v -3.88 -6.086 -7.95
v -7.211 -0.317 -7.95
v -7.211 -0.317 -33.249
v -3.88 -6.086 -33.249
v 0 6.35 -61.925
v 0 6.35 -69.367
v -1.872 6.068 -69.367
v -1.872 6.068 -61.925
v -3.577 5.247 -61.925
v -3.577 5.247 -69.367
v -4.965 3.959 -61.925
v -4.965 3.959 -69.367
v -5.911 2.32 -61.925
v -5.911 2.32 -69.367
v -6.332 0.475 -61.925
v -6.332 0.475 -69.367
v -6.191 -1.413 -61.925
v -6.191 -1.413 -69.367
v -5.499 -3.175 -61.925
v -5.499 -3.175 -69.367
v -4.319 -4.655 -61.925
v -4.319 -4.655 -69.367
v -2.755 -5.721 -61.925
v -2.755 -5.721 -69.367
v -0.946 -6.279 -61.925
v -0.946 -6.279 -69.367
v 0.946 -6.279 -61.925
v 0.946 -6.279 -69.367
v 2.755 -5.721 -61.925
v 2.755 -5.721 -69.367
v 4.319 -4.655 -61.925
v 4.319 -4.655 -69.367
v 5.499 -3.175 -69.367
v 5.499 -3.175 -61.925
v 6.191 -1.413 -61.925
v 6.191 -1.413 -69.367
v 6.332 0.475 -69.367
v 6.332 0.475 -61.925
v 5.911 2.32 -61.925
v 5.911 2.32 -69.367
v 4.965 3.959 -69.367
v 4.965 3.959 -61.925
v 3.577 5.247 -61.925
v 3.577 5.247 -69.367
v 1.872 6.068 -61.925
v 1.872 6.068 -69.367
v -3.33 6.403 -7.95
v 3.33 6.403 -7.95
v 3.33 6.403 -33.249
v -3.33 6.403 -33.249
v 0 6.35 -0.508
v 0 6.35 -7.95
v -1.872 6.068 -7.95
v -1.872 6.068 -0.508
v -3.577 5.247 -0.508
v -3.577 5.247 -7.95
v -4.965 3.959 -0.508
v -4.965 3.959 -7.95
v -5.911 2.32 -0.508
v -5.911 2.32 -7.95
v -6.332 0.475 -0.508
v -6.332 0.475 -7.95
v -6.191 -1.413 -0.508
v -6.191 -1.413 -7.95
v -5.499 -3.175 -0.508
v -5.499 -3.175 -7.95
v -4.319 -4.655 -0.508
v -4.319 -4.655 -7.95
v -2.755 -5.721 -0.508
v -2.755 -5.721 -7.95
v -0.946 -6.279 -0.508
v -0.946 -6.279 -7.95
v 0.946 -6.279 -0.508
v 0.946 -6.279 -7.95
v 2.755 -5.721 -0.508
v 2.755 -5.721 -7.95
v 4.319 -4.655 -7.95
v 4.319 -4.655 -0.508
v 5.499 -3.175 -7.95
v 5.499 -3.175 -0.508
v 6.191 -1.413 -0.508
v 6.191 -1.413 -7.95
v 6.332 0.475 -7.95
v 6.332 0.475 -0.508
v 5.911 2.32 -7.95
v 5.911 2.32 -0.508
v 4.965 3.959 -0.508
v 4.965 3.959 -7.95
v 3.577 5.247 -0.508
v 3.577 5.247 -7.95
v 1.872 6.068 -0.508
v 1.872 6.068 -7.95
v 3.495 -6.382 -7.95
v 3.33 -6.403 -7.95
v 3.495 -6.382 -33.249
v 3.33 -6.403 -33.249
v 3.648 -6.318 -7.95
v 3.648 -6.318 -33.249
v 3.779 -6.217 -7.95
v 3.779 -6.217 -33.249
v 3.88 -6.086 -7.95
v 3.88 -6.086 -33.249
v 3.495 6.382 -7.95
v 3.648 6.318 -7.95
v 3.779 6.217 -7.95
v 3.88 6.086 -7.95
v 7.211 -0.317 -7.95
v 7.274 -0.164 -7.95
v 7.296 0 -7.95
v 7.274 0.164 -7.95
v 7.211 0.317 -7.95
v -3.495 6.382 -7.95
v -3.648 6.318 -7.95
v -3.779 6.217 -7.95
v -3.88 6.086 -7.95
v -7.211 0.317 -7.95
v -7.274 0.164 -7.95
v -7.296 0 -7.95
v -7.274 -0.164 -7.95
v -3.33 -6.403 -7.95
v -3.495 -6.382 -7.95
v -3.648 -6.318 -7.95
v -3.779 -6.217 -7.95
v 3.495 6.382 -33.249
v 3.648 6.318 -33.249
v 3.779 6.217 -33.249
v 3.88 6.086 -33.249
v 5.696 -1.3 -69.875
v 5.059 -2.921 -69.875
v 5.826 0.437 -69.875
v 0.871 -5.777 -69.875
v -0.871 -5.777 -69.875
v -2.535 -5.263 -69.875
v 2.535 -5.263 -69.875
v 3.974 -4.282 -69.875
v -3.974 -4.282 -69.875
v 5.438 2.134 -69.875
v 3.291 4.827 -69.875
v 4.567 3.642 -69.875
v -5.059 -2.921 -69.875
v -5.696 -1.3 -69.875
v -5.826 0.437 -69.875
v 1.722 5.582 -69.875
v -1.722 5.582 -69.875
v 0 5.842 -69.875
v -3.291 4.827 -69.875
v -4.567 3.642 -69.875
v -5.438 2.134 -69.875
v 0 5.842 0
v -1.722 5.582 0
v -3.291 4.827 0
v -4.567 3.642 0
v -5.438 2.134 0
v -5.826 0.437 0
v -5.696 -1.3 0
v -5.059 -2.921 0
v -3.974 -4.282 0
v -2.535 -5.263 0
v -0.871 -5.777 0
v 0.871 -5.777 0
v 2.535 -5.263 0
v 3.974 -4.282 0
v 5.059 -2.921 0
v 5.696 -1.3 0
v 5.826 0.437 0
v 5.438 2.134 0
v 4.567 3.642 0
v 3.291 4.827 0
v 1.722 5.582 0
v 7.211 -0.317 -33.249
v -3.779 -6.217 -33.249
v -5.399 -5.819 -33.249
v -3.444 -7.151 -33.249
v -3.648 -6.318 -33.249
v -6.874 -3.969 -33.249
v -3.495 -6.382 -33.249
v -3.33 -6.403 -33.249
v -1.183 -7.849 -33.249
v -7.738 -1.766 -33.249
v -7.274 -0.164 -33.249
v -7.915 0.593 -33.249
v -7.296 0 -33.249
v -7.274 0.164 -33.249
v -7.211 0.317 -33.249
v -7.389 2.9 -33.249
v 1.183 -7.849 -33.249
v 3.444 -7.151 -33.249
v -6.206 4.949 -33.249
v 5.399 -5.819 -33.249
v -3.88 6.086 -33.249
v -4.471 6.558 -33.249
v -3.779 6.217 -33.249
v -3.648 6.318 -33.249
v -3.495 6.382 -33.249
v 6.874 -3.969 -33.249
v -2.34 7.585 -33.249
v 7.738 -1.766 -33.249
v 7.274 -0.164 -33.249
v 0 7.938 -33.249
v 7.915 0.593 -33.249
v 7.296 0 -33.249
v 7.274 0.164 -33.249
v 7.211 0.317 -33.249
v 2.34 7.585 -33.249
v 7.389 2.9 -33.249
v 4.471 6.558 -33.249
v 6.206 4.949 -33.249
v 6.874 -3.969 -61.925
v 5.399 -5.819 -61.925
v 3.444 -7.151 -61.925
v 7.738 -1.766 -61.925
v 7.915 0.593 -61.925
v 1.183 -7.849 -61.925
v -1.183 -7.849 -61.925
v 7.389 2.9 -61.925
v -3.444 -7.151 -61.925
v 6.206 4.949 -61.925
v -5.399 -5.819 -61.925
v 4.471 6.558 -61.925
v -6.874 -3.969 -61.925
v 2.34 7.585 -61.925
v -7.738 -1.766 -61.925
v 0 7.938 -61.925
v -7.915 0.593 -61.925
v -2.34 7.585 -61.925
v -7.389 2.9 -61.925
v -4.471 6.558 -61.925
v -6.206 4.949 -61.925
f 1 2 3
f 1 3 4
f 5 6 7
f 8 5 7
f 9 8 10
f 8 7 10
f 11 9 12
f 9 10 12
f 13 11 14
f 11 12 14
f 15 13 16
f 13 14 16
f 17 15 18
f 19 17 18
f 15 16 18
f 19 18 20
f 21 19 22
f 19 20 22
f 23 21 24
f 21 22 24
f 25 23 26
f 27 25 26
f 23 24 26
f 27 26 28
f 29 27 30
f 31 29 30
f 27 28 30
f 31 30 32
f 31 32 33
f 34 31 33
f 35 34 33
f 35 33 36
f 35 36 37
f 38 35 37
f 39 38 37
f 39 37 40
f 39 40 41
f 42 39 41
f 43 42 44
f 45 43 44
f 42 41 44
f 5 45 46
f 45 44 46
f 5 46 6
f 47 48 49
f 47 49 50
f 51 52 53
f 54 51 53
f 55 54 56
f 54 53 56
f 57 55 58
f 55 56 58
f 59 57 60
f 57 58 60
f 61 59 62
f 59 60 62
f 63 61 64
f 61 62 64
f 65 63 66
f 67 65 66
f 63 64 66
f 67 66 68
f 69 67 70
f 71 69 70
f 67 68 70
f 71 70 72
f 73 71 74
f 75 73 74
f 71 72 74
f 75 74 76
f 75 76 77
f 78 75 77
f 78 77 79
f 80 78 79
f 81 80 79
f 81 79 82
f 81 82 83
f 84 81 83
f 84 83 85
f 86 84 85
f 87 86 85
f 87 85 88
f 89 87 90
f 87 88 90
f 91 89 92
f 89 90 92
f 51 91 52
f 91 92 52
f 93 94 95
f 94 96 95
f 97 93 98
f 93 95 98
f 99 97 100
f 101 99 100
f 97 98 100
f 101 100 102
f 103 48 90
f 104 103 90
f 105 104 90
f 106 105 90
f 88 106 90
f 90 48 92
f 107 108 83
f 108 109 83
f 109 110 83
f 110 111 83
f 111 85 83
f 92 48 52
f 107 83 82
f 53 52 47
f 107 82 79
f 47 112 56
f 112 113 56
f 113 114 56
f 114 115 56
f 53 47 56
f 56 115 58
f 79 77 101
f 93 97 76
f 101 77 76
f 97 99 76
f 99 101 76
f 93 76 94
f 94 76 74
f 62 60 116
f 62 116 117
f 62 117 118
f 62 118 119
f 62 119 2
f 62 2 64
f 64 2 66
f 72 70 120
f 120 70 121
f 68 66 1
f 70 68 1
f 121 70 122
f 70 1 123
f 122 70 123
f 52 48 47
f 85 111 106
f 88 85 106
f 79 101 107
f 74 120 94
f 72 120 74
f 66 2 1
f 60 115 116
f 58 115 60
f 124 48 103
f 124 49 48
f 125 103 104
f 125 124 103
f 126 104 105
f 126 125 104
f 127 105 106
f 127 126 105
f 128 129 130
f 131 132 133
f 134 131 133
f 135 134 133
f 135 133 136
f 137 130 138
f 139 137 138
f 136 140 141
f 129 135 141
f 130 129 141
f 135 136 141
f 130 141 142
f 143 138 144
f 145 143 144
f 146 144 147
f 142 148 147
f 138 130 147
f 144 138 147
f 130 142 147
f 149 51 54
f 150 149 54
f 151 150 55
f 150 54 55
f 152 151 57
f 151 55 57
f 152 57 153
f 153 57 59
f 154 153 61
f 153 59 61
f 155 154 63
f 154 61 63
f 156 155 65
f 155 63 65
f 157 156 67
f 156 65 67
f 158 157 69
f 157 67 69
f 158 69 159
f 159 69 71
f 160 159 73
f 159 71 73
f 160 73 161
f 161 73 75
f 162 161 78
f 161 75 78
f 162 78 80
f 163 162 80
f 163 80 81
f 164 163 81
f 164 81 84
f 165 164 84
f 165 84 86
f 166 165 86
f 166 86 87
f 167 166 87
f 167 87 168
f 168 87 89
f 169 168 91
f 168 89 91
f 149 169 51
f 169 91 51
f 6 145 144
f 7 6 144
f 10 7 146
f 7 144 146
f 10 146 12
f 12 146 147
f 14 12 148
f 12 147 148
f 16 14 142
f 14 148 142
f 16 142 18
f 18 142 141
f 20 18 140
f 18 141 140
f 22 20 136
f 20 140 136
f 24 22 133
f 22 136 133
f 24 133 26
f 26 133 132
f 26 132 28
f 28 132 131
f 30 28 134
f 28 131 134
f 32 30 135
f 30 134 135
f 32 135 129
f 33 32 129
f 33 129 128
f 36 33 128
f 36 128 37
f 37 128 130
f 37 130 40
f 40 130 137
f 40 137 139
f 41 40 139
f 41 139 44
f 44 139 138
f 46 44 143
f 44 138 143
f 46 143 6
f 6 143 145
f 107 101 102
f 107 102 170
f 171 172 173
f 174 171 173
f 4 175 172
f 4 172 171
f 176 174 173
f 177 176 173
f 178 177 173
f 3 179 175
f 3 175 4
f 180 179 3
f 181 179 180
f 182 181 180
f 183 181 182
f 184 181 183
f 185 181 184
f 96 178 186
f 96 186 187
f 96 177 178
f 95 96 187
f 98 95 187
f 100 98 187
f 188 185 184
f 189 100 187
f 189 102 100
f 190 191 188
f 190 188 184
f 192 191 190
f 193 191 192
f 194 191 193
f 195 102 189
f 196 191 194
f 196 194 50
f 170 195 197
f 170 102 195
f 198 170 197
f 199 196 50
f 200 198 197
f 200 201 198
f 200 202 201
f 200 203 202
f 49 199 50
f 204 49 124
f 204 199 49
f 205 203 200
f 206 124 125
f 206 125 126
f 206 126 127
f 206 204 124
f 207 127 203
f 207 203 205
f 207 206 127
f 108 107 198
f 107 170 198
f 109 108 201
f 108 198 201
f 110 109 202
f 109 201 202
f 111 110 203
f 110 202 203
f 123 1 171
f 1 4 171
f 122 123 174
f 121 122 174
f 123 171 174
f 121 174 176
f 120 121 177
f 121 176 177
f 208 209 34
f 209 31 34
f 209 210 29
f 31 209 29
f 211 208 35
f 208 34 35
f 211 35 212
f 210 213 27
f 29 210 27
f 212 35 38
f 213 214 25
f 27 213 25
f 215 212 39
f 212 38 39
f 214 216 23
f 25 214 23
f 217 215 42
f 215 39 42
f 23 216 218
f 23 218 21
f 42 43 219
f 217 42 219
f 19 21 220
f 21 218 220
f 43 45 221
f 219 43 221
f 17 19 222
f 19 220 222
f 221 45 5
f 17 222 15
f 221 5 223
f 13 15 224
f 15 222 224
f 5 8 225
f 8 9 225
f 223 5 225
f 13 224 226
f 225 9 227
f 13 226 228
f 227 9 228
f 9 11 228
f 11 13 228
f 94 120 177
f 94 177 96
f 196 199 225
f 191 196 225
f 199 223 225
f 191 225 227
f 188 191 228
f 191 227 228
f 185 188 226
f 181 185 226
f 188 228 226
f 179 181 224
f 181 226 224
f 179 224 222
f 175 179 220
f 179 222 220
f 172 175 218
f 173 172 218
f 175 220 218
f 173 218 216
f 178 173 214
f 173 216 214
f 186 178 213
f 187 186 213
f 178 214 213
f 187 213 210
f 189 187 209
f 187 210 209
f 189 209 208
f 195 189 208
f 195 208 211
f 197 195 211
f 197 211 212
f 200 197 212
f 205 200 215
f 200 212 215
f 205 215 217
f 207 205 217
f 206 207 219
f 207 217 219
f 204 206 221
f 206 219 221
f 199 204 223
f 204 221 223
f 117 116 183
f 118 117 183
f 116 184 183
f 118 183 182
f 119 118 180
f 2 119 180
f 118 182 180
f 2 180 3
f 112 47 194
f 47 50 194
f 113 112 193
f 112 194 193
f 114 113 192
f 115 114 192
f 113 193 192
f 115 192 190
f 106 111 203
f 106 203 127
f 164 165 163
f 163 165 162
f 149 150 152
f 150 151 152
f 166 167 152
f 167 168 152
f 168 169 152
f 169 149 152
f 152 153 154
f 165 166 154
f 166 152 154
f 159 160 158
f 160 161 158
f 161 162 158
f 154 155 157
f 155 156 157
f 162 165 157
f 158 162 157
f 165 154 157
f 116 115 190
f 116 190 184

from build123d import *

# Parameters (mm, degrees)
SKETCH2_OUTSIDE_W  = 32.552
SKETCH2_OUTSIDE_H  = 32.553
CUT_EXTRUDE1_DEPTH = 25.2984
CHAMFER1_SIZE      = 0.508
FILLET1_R          = 0.635


with BuildPart() as part:
    # Sketch1 → Revolve1 (revolve)
    with BuildSketch(Plane(origin=(0, 0, 0), x_dir=(0, 0, -1), z_dir=(1, 0, 0))):
        Polygon((0, 0), (0, 6.35), (7.9502, 6.35), (7.9502, 7.62), (33.2486, 7.62), (33.2486, 7.9375), (61.9252, 7.9375), (61.9252, 6.35), (69.8754, 6.35), (69.8754, 0), align=None)
    revolve(axis=Axis((0, 0, 0), (0, 0, 1)))

    # Sketch2 outside → Cut-Extrude1 (cut)
    with BuildSketch(Plane.XY.offset(-7.9502)):
        with Locations((0, 0.0005)):
            Rectangle(SKETCH2_OUTSIDE_W, SKETCH2_OUTSIDE_H)
        Polygon((3.696970073, 6.40334), (-3.696970073, 6.40334), (-7.393940145, 0), (-3.696970073, -6.40334), (3.696970073, -6.40334), (7.393940145, 0), align=None, mode=Mode.SUBTRACT)
    extrude(amount=-CUT_EXTRUDE1_DEPTH, mode=Mode.SUBTRACT)

    # Chamfer1
    chamfer1_edges = [part.edges().sort_by_distance(p)[0] for p in [
        (0, -6.35, 0),
        (0, -6.35, -69.8754),
    ]]
    chamfer(chamfer1_edges, length=CHAMFER1_SIZE)

    # Fillet1
    fillet1_edges = [part.edges().sort_by_distance(p)[0] for p in [
        (3.696970073, 6.40334, -20.5994),
        (-3.696970073, 6.40334, -20.5994),
        (-7.393940145, 0, -20.5994),
        (-3.696970073, -6.40334, -20.5994),
        (3.696970073, -6.40334, -20.5994),
        (7.393940145, 0, -20.5994),
    ]]
    fillet(fillet1_edges, radius=FILLET1_R)


solid = part.part
